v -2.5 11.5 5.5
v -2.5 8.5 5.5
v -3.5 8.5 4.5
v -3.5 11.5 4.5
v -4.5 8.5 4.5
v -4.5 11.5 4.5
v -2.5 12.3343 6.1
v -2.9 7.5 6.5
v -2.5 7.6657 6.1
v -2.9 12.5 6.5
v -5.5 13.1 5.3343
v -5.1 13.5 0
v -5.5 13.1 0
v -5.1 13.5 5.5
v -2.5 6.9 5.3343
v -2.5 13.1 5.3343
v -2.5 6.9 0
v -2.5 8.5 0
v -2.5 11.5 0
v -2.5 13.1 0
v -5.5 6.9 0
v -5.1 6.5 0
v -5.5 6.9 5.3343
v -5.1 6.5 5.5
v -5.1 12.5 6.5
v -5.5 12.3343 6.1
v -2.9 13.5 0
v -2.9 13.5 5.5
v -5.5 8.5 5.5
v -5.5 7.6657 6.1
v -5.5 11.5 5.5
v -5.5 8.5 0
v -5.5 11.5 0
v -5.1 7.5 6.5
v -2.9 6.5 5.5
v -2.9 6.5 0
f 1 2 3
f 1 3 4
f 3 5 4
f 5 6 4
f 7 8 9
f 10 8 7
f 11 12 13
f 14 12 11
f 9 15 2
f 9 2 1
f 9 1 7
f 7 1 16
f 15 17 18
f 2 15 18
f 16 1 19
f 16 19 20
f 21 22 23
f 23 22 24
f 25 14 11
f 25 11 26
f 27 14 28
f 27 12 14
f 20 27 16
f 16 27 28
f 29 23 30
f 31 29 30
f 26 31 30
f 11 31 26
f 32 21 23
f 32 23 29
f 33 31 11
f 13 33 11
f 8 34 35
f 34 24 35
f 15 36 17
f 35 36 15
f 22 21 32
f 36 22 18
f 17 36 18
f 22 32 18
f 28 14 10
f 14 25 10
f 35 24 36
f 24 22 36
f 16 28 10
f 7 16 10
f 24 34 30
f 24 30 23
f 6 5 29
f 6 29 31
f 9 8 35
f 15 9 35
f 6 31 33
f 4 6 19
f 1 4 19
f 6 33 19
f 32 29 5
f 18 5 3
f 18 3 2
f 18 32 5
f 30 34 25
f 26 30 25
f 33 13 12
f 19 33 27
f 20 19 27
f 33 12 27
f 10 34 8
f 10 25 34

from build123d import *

# Parameters (mm, degrees)
BOX003_W        = 3
BOX003_H        = 3
BOX003_DEPTH    = 4.5
BOX002_W        = 3
BOX002_H        = 7
BOX002_DEPTH    = 6.5
CHAMFER005_SIZE = 1
CHAMFER006_SIZE = 1
CHAMFER007_SIZE = 0.4


with BuildPart() as cube003:
    # Box003 → Box003 (new body)
    with BuildSketch(Plane(origin=(-1.5, -1.5, 0), x_dir=(1, 0, 0), z_dir=(0, 0, 1))):
        with Locations((1.5, 1.5)):
            Rectangle(BOX003_W, BOX003_H)
    extrude(amount=BOX003_DEPTH)


with BuildPart() as ziptie_slot001:
    # Box002 → Box002 (new body)
    with BuildSketch(Plane(origin=(-1.5, -3.5, 0), x_dir=(1, 0, 0), z_dir=(0, 0, 1))):
        with Locations((1.5, 3.5)):
            Rectangle(BOX002_W, BOX002_H)
    extrude(amount=BOX002_DEPTH)

    # Cut002: cut Cube003
    add(cube003.part, mode=Mode.SUBTRACT)

    # Chamfer005
    chamfer005_edges = [ziptie_slot001.edges().sort_by_distance(p)[0] for p in [
        (0, 3.5, 6.5),
        (0, -3.5, 6.5),
    ]]
    chamfer(chamfer005_edges, length=CHAMFER005_SIZE)

    # Chamfer006
    chamfer006_edges = [ziptie_slot001.edges().sort_by_distance(p)[0] for p in [
        (-1.5, 0, 4.5),
        (1.5, 0, 4.5),
    ]]
    chamfer(chamfer006_edges, length=CHAMFER006_SIZE)

    # Chamfer007
    chamfer007_edges = [ziptie_slot001.edges().sort_by_distance(p)[0] for p in [
        (-1.5, 3.5, 2.75),
        (-1.5, 3, 6),
        (-1.5, 0, 6.5),
        (-1.5, -3, 6),
        (-1.5, -3.5, 2.75),
        (1.5, -3.5, 2.75),
        (1.5, -3, 6),
        (1.5, 0, 6.5),
        (1.5, 3.5, 2.75),
        (1.5, 3, 6),
    ]]
    chamfer(chamfer007_edges, length=CHAMFER007_SIZE)


with BuildPart() as ziptie_slot001_1:
    # Chamfer007001 placement: moved
    add(ziptie_slot001.part.moved(Location((-4, 10, 0))))


solid = ziptie_slot001_1.part
